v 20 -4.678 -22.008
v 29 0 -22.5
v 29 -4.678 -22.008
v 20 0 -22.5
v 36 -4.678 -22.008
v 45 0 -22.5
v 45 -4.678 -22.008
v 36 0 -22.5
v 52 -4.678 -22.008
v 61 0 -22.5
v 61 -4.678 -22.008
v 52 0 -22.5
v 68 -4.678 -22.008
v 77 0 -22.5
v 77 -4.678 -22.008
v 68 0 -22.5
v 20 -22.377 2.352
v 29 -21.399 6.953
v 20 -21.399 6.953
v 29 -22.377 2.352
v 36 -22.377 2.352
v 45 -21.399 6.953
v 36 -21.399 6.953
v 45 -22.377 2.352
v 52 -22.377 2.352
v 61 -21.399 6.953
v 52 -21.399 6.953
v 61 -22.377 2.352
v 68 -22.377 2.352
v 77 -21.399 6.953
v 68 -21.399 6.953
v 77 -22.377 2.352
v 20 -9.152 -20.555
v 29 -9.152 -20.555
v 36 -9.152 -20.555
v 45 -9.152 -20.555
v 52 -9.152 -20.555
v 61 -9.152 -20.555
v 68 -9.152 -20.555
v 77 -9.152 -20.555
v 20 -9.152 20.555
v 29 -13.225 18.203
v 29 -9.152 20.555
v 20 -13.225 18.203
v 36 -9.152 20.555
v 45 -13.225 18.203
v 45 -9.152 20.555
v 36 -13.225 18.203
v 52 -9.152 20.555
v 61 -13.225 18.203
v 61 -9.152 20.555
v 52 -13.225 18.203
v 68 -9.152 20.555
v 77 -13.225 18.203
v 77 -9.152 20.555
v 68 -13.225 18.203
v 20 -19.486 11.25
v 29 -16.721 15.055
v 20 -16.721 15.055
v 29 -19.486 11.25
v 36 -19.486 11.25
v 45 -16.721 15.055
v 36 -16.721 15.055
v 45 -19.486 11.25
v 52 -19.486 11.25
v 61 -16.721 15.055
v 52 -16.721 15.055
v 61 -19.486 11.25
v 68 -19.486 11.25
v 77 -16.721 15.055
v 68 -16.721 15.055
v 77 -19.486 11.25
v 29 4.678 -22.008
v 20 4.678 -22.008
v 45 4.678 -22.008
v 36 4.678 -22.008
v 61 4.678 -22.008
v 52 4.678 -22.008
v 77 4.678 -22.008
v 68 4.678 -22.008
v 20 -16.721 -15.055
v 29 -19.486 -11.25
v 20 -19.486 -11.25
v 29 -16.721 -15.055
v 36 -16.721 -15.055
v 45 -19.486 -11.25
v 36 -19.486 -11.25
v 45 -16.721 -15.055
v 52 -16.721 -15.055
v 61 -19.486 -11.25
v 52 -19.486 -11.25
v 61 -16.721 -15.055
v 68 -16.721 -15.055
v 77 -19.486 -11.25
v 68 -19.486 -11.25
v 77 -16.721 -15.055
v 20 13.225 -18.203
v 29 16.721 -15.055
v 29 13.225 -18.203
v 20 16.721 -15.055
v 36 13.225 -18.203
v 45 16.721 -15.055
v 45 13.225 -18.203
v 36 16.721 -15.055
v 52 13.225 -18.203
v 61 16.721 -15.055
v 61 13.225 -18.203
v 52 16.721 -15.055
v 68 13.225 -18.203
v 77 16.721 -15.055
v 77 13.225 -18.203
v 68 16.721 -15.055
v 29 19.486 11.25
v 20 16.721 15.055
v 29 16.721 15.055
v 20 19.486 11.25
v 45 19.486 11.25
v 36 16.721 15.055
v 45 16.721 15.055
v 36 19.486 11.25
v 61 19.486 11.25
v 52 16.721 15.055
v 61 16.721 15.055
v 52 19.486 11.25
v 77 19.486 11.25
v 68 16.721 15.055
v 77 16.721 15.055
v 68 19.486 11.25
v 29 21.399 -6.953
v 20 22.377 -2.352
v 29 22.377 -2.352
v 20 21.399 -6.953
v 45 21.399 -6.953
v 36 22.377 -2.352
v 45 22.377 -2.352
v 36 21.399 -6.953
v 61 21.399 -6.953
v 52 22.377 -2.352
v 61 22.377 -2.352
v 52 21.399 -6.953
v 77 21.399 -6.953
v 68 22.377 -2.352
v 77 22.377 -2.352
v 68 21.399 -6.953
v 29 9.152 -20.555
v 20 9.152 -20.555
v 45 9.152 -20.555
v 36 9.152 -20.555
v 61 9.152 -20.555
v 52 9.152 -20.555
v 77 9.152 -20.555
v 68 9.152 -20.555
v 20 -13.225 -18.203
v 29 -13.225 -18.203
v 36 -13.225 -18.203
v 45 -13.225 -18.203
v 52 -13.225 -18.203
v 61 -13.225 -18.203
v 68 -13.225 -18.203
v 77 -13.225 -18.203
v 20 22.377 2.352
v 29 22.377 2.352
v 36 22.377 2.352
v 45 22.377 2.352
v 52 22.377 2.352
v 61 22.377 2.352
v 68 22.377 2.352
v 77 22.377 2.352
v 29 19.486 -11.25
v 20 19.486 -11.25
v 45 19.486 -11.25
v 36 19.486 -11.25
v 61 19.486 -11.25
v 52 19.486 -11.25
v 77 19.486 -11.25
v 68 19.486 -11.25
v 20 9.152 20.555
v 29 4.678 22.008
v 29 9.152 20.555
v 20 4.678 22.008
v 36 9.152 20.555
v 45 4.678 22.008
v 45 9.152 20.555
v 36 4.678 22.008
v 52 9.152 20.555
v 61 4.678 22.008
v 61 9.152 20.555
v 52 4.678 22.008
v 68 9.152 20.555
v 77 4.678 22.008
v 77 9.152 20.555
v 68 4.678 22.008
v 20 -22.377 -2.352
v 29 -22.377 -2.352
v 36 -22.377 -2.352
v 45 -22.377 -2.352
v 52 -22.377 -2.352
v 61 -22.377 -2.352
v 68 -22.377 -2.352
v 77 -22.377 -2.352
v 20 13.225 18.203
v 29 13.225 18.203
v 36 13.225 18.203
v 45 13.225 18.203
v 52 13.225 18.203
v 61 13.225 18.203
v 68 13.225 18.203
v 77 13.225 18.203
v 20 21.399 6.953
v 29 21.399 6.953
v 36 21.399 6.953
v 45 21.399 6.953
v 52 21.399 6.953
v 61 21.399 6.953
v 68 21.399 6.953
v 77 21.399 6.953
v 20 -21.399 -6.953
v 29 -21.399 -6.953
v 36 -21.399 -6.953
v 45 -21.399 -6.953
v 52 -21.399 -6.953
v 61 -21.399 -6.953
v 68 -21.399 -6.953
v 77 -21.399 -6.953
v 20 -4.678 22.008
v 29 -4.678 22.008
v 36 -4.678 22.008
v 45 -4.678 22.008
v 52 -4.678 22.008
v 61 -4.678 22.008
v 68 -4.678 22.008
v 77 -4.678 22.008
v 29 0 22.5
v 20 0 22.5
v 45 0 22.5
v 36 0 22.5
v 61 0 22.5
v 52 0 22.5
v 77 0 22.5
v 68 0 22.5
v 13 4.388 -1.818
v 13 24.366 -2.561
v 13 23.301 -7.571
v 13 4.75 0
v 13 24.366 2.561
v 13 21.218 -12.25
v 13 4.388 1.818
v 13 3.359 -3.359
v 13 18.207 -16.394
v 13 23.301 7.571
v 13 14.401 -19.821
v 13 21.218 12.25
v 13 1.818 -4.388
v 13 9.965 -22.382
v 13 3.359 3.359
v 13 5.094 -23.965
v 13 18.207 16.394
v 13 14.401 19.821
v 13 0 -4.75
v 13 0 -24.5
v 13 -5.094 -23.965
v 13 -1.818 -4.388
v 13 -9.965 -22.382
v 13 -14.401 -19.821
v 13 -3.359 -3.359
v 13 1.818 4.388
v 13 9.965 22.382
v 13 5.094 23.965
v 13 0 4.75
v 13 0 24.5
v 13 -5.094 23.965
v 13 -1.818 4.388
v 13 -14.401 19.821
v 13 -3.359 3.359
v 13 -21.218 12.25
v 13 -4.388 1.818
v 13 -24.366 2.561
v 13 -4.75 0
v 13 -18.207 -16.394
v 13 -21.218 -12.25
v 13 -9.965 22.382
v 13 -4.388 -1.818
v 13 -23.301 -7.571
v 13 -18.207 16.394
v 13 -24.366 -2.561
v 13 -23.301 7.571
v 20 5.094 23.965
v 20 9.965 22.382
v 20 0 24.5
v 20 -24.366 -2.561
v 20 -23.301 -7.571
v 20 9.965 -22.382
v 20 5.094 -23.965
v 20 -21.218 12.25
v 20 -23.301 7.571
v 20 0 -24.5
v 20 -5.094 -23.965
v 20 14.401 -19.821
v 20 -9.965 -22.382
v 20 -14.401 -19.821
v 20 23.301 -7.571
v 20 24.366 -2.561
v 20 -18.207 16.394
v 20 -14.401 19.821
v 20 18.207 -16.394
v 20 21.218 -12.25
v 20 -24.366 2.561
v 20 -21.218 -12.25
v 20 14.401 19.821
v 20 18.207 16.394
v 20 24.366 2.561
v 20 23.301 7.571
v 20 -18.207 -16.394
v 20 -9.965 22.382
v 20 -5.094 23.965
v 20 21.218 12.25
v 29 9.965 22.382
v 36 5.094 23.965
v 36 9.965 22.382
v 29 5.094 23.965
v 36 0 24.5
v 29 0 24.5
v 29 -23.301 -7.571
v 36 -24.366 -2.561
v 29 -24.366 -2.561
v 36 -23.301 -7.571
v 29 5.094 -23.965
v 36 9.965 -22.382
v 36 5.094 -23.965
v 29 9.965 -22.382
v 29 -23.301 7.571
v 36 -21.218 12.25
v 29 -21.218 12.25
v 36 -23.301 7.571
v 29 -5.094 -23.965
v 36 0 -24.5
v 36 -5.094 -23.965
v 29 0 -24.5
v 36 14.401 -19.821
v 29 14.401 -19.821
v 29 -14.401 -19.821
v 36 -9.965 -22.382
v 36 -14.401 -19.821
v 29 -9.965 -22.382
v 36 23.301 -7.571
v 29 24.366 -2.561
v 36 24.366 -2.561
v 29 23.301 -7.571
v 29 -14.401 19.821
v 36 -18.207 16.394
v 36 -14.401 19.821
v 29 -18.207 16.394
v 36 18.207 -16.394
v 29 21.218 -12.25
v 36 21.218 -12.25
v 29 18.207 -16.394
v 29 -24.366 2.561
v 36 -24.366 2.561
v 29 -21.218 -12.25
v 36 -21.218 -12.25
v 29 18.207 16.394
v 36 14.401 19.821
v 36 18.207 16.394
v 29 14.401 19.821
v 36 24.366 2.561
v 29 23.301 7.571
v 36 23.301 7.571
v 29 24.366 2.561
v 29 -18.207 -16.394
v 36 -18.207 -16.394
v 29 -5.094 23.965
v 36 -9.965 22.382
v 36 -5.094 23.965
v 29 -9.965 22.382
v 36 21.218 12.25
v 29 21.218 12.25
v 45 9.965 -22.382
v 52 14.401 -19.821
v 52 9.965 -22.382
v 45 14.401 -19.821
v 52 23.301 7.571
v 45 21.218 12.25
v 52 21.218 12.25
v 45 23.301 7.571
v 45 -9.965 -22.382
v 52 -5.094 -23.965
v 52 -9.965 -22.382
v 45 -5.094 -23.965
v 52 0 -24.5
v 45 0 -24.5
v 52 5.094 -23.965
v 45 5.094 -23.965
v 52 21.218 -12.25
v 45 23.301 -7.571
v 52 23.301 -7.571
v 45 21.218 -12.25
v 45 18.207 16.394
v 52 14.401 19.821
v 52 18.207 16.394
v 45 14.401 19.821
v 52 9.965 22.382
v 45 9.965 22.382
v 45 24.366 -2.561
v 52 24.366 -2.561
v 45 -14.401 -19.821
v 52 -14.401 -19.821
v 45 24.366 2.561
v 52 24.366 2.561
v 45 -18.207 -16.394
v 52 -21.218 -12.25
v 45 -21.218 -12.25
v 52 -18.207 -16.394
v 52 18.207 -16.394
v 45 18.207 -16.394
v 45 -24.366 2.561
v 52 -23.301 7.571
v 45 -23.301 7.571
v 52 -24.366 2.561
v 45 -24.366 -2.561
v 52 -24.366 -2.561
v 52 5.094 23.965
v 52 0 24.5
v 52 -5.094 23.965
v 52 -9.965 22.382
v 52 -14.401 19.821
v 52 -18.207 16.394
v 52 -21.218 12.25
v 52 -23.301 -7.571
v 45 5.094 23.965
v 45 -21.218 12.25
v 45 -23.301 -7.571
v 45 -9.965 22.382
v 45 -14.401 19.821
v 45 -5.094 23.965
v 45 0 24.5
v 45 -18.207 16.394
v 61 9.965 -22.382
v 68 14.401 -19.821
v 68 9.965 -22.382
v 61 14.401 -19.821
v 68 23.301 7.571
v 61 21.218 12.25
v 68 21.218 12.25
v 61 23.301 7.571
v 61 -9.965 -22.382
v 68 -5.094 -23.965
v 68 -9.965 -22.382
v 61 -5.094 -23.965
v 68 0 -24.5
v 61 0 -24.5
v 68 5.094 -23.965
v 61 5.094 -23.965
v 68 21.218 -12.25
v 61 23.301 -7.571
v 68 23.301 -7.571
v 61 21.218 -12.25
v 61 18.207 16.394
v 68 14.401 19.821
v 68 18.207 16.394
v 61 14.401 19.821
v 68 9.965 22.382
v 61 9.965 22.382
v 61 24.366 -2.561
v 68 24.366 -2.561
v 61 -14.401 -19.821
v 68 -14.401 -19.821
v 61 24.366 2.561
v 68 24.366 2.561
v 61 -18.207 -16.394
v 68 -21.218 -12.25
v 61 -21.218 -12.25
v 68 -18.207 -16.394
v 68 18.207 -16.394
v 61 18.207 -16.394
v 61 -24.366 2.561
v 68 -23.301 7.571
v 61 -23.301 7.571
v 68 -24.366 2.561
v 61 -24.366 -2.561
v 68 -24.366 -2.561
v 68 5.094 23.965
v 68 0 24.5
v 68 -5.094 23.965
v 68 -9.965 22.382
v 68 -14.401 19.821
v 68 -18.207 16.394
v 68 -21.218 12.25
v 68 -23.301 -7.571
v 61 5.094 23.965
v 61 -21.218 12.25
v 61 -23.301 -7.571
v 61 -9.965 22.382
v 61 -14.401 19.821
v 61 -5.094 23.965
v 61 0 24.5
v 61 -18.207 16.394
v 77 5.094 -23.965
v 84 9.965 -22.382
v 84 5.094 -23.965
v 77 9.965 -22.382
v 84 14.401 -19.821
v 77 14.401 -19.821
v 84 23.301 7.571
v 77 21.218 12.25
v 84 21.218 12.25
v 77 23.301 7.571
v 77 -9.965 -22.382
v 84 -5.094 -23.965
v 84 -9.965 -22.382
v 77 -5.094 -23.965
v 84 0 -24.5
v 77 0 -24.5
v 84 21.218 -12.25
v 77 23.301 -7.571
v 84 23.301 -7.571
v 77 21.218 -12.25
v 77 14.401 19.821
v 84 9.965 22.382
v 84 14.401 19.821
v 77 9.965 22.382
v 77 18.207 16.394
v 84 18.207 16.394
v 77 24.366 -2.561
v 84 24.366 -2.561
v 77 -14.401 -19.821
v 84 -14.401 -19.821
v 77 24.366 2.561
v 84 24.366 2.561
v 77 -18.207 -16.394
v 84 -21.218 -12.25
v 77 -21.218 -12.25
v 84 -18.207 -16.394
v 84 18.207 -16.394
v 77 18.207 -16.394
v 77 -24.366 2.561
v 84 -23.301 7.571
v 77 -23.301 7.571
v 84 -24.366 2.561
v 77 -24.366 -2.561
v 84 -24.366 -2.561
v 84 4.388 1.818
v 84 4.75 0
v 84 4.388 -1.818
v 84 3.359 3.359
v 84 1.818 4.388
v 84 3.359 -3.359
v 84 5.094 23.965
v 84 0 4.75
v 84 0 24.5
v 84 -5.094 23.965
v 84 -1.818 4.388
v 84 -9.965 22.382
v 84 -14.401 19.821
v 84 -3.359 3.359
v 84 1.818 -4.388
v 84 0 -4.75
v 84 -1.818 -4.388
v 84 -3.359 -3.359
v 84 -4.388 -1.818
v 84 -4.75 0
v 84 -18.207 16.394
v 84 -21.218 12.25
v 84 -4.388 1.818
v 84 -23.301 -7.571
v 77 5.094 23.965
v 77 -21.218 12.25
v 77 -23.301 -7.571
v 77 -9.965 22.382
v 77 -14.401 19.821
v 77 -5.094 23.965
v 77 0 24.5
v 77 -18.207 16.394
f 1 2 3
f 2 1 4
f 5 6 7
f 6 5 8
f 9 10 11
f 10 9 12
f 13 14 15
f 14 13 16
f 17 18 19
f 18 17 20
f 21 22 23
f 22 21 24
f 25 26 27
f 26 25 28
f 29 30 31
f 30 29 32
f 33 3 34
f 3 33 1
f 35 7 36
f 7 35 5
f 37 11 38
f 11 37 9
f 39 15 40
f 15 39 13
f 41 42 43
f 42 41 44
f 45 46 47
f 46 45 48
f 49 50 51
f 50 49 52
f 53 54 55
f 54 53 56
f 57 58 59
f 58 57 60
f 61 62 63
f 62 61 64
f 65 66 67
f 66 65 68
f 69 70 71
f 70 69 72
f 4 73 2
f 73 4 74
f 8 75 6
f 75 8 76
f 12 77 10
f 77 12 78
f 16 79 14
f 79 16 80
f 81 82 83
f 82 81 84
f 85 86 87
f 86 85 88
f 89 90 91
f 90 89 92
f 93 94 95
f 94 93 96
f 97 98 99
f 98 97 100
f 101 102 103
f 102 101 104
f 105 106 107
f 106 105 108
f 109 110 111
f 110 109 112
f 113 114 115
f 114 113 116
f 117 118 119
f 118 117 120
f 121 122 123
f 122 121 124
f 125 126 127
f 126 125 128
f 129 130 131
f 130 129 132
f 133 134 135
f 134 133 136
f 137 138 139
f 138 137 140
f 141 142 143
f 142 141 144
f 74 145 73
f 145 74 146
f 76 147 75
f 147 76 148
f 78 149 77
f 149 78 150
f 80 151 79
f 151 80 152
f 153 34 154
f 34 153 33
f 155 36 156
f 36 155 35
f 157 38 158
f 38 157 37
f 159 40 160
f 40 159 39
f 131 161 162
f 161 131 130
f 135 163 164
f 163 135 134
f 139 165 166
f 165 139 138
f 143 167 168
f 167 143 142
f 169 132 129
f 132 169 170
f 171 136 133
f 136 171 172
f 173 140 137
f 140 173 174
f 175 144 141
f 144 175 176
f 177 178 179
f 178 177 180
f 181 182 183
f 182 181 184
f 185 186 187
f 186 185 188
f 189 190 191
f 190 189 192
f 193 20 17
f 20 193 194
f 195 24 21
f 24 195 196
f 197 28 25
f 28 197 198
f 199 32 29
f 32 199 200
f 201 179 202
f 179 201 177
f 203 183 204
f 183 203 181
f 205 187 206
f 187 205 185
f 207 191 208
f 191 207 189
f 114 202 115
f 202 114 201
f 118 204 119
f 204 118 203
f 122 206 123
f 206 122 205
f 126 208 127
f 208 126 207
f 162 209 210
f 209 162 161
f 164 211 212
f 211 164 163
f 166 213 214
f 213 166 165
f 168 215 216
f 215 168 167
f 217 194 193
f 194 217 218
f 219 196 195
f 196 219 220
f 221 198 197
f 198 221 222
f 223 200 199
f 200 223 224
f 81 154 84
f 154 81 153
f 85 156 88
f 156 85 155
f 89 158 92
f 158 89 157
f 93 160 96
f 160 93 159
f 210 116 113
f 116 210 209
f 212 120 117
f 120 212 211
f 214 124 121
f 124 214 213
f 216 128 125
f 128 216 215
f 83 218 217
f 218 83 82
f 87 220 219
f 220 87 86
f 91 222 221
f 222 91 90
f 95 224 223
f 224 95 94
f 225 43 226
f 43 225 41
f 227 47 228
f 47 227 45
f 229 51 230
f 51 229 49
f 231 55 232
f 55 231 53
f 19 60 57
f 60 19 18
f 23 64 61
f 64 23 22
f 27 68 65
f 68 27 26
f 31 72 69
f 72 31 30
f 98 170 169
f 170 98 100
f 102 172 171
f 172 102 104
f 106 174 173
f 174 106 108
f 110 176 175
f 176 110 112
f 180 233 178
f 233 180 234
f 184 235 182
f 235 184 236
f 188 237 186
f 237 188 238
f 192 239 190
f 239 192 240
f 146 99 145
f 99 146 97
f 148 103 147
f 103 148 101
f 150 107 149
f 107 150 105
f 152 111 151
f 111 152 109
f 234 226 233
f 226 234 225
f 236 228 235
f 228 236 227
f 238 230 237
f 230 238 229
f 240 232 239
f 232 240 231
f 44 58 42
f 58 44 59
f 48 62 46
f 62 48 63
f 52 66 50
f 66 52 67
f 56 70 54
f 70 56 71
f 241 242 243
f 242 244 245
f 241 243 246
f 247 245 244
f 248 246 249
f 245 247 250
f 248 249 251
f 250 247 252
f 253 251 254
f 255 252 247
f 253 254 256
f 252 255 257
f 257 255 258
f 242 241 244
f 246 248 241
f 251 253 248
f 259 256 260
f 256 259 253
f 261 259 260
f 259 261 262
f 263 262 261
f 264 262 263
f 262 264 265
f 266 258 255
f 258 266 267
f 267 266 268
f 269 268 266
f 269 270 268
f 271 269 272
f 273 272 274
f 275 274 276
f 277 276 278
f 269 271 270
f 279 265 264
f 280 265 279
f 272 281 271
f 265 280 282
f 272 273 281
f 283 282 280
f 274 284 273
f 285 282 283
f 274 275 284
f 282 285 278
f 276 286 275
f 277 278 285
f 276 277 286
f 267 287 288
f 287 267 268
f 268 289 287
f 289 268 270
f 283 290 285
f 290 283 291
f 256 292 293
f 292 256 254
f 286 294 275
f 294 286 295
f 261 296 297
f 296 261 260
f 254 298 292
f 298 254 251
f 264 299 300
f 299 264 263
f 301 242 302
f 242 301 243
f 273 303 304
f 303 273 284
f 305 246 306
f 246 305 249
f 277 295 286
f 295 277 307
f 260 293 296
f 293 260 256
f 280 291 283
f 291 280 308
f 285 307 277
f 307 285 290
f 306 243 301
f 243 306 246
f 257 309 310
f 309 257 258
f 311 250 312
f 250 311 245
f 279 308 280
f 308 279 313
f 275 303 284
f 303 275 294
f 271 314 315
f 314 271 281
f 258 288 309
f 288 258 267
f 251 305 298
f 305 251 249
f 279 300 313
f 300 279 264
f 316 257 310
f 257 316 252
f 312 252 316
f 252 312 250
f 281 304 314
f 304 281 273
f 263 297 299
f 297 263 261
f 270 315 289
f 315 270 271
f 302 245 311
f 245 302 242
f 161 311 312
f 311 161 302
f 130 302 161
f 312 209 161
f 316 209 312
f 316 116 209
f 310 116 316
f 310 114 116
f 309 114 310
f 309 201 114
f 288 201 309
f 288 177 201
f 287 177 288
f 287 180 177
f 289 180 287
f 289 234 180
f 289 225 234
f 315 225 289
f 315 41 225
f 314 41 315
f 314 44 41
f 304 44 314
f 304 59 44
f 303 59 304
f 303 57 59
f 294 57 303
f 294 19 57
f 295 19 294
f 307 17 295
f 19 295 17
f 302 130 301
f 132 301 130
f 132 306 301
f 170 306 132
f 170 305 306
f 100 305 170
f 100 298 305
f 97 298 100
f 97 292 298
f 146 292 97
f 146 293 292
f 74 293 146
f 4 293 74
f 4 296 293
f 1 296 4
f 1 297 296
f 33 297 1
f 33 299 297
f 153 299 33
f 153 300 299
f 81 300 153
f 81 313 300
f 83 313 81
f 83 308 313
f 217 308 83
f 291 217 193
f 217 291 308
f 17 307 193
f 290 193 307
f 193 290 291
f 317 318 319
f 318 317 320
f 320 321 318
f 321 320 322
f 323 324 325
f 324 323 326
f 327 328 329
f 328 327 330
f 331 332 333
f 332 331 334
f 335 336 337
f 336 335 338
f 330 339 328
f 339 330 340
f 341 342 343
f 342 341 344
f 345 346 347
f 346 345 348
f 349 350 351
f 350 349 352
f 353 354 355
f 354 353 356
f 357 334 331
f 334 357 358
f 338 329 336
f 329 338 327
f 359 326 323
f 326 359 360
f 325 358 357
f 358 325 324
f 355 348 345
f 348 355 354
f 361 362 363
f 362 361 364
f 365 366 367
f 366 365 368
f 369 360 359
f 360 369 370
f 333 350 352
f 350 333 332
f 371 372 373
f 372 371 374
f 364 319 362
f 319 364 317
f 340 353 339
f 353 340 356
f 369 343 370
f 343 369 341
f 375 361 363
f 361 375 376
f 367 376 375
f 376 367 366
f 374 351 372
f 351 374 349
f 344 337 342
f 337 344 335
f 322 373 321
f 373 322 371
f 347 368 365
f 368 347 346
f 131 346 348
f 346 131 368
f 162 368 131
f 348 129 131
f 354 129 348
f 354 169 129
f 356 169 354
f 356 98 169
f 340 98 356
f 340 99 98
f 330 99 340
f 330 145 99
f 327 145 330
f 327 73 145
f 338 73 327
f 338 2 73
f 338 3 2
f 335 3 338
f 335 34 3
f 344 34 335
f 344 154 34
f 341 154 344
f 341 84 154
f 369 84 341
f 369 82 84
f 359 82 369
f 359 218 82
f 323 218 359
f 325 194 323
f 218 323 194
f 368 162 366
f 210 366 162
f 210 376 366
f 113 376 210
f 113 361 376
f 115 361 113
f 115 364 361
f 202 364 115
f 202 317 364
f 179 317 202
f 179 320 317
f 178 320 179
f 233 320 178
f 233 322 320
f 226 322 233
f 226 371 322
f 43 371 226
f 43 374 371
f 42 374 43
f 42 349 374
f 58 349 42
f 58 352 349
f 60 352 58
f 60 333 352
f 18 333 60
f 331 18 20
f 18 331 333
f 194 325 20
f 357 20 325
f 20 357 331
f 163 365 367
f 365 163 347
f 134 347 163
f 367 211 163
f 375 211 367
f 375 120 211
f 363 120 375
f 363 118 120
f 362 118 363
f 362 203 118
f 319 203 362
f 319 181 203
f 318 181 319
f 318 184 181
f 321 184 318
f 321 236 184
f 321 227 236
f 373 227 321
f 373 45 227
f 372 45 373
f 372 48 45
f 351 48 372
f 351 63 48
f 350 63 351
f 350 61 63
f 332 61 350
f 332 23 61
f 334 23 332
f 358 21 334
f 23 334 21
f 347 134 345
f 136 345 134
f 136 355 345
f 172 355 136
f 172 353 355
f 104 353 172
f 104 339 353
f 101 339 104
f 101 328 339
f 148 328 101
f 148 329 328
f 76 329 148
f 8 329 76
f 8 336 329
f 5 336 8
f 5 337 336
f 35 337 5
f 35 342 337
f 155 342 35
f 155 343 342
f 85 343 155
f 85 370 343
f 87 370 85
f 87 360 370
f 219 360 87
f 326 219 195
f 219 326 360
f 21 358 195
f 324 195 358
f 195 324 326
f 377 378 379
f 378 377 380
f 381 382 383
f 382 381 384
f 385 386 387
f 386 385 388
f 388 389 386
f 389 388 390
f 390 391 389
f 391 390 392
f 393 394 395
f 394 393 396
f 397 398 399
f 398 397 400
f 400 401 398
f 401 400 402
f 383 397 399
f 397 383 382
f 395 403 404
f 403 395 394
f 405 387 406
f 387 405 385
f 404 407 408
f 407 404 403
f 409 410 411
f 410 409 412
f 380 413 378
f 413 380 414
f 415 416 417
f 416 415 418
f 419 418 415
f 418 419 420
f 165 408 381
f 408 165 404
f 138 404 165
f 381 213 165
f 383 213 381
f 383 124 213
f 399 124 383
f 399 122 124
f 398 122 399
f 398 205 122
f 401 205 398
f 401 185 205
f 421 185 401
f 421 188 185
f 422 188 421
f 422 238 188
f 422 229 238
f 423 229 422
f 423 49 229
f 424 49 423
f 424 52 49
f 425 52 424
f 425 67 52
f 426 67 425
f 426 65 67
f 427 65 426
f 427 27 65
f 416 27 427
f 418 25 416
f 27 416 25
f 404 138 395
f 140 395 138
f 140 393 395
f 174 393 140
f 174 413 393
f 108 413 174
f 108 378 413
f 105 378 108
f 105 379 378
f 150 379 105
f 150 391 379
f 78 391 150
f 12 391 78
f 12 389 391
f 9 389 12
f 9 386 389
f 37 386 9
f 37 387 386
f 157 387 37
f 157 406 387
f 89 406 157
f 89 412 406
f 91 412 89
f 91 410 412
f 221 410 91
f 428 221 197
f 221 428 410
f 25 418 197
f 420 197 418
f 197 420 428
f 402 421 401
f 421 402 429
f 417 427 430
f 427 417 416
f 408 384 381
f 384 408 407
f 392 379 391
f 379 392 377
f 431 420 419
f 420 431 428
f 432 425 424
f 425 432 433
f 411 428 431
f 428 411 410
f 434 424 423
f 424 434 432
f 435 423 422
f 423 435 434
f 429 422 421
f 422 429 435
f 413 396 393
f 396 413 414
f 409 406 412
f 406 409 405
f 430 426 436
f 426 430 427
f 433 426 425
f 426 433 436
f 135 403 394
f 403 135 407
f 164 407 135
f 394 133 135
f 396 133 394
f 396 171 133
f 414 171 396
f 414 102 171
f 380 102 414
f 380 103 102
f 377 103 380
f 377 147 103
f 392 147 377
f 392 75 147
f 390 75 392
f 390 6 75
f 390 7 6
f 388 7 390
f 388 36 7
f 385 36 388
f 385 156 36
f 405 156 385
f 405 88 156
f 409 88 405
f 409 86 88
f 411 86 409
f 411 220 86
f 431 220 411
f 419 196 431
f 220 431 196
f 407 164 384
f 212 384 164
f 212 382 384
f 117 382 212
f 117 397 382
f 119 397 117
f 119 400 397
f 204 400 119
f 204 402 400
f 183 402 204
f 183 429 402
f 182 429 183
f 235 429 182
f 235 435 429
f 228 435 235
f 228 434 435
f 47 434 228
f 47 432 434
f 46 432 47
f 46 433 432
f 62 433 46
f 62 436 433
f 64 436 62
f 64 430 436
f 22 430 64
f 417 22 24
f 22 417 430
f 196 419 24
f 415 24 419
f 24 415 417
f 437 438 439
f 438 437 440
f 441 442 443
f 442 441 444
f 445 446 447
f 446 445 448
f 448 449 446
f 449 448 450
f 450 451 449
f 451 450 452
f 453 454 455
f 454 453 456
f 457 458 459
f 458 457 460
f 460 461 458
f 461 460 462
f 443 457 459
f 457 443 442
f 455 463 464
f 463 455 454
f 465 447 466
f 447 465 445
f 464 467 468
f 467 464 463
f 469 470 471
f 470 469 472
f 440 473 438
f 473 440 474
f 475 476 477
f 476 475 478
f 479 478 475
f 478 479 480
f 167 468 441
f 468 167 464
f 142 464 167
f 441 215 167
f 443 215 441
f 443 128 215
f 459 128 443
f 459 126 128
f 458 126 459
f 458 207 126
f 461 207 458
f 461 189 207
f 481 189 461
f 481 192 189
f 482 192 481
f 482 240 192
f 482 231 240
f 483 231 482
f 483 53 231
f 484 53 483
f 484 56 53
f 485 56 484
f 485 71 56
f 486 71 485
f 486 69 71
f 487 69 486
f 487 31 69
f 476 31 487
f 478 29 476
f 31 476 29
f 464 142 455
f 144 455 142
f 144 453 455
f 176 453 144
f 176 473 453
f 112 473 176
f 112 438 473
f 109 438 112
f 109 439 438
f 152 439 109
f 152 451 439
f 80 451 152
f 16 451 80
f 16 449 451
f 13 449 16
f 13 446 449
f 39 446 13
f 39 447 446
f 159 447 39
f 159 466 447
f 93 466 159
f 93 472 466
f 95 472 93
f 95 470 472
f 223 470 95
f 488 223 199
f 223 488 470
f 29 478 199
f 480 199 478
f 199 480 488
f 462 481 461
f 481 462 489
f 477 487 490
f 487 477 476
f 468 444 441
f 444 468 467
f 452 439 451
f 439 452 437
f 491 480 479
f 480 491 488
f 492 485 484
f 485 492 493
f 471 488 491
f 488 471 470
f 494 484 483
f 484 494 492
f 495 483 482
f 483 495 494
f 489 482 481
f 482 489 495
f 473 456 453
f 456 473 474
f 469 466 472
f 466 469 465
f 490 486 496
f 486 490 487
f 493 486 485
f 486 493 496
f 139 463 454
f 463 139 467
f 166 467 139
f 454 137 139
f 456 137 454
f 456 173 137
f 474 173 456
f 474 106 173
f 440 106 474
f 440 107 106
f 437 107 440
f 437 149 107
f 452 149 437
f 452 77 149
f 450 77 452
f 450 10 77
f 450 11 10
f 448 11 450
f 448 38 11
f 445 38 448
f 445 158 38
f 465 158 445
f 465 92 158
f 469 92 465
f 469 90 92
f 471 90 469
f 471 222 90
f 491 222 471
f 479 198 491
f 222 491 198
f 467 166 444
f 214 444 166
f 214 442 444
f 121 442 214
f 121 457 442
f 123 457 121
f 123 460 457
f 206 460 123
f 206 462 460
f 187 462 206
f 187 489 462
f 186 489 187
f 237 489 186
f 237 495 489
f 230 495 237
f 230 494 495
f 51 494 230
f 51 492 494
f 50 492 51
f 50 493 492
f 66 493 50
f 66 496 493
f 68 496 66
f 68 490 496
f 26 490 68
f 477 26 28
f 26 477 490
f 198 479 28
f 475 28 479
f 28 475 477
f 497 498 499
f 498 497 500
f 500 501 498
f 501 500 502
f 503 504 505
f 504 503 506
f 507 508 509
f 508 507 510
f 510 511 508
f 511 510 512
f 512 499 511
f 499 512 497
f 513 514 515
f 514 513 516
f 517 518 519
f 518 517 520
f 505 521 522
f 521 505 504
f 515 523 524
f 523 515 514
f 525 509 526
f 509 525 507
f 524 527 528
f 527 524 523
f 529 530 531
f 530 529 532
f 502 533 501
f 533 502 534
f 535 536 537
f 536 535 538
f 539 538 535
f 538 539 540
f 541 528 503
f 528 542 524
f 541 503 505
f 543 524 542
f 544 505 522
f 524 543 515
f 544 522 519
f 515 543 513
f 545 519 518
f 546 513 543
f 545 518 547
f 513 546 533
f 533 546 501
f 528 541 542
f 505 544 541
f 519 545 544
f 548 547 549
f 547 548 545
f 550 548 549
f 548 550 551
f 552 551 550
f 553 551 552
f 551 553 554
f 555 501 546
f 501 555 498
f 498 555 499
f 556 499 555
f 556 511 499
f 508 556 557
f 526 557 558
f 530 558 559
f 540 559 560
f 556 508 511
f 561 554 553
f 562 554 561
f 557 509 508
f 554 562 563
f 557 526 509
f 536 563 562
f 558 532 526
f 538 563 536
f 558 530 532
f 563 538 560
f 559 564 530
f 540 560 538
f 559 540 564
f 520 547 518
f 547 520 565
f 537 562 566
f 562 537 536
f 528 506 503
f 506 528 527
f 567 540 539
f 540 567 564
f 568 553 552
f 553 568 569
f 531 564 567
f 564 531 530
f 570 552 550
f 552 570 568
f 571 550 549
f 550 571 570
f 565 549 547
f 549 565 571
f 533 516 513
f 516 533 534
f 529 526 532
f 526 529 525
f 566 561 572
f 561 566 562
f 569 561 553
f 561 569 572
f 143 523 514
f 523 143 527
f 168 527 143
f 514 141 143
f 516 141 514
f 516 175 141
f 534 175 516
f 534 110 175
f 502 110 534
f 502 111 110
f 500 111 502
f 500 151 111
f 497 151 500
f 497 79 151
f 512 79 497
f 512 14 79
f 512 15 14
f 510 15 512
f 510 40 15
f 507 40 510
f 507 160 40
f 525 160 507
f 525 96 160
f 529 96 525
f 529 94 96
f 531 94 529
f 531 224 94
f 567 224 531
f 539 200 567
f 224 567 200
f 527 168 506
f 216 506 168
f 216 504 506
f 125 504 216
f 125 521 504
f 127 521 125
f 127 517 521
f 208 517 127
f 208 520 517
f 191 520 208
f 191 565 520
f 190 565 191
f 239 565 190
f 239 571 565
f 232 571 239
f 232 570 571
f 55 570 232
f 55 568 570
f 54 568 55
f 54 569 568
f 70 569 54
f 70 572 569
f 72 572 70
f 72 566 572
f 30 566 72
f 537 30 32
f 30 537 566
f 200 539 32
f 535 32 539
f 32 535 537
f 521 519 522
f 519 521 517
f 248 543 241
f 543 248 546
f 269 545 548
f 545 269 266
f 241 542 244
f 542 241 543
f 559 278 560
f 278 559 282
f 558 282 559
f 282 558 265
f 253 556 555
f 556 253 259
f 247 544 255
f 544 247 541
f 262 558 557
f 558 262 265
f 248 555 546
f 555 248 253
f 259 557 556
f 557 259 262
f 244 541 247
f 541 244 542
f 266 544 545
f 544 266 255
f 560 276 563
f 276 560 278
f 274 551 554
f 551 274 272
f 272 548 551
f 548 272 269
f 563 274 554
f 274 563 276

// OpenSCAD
// file: vars.scad
SIDE_WIDTH = 8;
RESERVE_V = 10;
RESERVE_H = 15;
RESERVE_R = 0.5;
OUTER_R = 100;
INNER_R = 25;
SPOOL_WIDTH = 70;
AXIS_R = 5;
// main file
include <vars.scad>

module axis_cylinder()
{      
    difference()
    {
        union()
        {
            translate([SIDE_WIDTH* 1.5 + 1,0,0])
            rotate([0,90,0])
            cylinder(h = SPOOL_WIDTH, r = INNER_R - RESERVE_R * 5);
            
            OFFSET = (SPOOL_WIDTH + RESERVE_H - 2*SIDE_WIDTH - 2) / 5;
            
            translate([SIDE_WIDTH* 1.5 + 1,0,0])
            rotate([0,90,0])
            cylinder(h = SIDE_WIDTH - 1, r = INNER_R - RESERVE_R);       
            
            translate([SIDE_WIDTH* 1.5 + 1 + SIDE_WIDTH * 2,0,0])
            rotate([0,90,0])
            cylinder(h = SIDE_WIDTH - 1, r = INNER_R - RESERVE_R);
            
            translate([SIDE_WIDTH* 1.5 + 1 + SIDE_WIDTH * 4,0,0])
            rotate([0,90,0])
            cylinder(h = SIDE_WIDTH - 1, r = INNER_R - RESERVE_R);
            
            translate([SIDE_WIDTH* 1.5 + 1 + SIDE_WIDTH * 6,0,0])
            rotate([0,90,0])
            cylinder(h = SIDE_WIDTH - 1, r = INNER_R - RESERVE_R);
            
            translate([SIDE_WIDTH* 1.5 + 1 + SIDE_WIDTH * 8,0,0])
            rotate([0,90,0])
            cylinder(h = SIDE_WIDTH - 1, r = INNER_R - RESERVE_R);
        }
        
        translate([0,0,0])
        rotate([0,90,0])
        cylinder(h = SIDE_WIDTH * 2 + SPOOL_WIDTH + RESERVE_H, r = AXIS_R - RESERVE_R + 0.25, $fn = 16);
    }
}

axis_cylinder();
